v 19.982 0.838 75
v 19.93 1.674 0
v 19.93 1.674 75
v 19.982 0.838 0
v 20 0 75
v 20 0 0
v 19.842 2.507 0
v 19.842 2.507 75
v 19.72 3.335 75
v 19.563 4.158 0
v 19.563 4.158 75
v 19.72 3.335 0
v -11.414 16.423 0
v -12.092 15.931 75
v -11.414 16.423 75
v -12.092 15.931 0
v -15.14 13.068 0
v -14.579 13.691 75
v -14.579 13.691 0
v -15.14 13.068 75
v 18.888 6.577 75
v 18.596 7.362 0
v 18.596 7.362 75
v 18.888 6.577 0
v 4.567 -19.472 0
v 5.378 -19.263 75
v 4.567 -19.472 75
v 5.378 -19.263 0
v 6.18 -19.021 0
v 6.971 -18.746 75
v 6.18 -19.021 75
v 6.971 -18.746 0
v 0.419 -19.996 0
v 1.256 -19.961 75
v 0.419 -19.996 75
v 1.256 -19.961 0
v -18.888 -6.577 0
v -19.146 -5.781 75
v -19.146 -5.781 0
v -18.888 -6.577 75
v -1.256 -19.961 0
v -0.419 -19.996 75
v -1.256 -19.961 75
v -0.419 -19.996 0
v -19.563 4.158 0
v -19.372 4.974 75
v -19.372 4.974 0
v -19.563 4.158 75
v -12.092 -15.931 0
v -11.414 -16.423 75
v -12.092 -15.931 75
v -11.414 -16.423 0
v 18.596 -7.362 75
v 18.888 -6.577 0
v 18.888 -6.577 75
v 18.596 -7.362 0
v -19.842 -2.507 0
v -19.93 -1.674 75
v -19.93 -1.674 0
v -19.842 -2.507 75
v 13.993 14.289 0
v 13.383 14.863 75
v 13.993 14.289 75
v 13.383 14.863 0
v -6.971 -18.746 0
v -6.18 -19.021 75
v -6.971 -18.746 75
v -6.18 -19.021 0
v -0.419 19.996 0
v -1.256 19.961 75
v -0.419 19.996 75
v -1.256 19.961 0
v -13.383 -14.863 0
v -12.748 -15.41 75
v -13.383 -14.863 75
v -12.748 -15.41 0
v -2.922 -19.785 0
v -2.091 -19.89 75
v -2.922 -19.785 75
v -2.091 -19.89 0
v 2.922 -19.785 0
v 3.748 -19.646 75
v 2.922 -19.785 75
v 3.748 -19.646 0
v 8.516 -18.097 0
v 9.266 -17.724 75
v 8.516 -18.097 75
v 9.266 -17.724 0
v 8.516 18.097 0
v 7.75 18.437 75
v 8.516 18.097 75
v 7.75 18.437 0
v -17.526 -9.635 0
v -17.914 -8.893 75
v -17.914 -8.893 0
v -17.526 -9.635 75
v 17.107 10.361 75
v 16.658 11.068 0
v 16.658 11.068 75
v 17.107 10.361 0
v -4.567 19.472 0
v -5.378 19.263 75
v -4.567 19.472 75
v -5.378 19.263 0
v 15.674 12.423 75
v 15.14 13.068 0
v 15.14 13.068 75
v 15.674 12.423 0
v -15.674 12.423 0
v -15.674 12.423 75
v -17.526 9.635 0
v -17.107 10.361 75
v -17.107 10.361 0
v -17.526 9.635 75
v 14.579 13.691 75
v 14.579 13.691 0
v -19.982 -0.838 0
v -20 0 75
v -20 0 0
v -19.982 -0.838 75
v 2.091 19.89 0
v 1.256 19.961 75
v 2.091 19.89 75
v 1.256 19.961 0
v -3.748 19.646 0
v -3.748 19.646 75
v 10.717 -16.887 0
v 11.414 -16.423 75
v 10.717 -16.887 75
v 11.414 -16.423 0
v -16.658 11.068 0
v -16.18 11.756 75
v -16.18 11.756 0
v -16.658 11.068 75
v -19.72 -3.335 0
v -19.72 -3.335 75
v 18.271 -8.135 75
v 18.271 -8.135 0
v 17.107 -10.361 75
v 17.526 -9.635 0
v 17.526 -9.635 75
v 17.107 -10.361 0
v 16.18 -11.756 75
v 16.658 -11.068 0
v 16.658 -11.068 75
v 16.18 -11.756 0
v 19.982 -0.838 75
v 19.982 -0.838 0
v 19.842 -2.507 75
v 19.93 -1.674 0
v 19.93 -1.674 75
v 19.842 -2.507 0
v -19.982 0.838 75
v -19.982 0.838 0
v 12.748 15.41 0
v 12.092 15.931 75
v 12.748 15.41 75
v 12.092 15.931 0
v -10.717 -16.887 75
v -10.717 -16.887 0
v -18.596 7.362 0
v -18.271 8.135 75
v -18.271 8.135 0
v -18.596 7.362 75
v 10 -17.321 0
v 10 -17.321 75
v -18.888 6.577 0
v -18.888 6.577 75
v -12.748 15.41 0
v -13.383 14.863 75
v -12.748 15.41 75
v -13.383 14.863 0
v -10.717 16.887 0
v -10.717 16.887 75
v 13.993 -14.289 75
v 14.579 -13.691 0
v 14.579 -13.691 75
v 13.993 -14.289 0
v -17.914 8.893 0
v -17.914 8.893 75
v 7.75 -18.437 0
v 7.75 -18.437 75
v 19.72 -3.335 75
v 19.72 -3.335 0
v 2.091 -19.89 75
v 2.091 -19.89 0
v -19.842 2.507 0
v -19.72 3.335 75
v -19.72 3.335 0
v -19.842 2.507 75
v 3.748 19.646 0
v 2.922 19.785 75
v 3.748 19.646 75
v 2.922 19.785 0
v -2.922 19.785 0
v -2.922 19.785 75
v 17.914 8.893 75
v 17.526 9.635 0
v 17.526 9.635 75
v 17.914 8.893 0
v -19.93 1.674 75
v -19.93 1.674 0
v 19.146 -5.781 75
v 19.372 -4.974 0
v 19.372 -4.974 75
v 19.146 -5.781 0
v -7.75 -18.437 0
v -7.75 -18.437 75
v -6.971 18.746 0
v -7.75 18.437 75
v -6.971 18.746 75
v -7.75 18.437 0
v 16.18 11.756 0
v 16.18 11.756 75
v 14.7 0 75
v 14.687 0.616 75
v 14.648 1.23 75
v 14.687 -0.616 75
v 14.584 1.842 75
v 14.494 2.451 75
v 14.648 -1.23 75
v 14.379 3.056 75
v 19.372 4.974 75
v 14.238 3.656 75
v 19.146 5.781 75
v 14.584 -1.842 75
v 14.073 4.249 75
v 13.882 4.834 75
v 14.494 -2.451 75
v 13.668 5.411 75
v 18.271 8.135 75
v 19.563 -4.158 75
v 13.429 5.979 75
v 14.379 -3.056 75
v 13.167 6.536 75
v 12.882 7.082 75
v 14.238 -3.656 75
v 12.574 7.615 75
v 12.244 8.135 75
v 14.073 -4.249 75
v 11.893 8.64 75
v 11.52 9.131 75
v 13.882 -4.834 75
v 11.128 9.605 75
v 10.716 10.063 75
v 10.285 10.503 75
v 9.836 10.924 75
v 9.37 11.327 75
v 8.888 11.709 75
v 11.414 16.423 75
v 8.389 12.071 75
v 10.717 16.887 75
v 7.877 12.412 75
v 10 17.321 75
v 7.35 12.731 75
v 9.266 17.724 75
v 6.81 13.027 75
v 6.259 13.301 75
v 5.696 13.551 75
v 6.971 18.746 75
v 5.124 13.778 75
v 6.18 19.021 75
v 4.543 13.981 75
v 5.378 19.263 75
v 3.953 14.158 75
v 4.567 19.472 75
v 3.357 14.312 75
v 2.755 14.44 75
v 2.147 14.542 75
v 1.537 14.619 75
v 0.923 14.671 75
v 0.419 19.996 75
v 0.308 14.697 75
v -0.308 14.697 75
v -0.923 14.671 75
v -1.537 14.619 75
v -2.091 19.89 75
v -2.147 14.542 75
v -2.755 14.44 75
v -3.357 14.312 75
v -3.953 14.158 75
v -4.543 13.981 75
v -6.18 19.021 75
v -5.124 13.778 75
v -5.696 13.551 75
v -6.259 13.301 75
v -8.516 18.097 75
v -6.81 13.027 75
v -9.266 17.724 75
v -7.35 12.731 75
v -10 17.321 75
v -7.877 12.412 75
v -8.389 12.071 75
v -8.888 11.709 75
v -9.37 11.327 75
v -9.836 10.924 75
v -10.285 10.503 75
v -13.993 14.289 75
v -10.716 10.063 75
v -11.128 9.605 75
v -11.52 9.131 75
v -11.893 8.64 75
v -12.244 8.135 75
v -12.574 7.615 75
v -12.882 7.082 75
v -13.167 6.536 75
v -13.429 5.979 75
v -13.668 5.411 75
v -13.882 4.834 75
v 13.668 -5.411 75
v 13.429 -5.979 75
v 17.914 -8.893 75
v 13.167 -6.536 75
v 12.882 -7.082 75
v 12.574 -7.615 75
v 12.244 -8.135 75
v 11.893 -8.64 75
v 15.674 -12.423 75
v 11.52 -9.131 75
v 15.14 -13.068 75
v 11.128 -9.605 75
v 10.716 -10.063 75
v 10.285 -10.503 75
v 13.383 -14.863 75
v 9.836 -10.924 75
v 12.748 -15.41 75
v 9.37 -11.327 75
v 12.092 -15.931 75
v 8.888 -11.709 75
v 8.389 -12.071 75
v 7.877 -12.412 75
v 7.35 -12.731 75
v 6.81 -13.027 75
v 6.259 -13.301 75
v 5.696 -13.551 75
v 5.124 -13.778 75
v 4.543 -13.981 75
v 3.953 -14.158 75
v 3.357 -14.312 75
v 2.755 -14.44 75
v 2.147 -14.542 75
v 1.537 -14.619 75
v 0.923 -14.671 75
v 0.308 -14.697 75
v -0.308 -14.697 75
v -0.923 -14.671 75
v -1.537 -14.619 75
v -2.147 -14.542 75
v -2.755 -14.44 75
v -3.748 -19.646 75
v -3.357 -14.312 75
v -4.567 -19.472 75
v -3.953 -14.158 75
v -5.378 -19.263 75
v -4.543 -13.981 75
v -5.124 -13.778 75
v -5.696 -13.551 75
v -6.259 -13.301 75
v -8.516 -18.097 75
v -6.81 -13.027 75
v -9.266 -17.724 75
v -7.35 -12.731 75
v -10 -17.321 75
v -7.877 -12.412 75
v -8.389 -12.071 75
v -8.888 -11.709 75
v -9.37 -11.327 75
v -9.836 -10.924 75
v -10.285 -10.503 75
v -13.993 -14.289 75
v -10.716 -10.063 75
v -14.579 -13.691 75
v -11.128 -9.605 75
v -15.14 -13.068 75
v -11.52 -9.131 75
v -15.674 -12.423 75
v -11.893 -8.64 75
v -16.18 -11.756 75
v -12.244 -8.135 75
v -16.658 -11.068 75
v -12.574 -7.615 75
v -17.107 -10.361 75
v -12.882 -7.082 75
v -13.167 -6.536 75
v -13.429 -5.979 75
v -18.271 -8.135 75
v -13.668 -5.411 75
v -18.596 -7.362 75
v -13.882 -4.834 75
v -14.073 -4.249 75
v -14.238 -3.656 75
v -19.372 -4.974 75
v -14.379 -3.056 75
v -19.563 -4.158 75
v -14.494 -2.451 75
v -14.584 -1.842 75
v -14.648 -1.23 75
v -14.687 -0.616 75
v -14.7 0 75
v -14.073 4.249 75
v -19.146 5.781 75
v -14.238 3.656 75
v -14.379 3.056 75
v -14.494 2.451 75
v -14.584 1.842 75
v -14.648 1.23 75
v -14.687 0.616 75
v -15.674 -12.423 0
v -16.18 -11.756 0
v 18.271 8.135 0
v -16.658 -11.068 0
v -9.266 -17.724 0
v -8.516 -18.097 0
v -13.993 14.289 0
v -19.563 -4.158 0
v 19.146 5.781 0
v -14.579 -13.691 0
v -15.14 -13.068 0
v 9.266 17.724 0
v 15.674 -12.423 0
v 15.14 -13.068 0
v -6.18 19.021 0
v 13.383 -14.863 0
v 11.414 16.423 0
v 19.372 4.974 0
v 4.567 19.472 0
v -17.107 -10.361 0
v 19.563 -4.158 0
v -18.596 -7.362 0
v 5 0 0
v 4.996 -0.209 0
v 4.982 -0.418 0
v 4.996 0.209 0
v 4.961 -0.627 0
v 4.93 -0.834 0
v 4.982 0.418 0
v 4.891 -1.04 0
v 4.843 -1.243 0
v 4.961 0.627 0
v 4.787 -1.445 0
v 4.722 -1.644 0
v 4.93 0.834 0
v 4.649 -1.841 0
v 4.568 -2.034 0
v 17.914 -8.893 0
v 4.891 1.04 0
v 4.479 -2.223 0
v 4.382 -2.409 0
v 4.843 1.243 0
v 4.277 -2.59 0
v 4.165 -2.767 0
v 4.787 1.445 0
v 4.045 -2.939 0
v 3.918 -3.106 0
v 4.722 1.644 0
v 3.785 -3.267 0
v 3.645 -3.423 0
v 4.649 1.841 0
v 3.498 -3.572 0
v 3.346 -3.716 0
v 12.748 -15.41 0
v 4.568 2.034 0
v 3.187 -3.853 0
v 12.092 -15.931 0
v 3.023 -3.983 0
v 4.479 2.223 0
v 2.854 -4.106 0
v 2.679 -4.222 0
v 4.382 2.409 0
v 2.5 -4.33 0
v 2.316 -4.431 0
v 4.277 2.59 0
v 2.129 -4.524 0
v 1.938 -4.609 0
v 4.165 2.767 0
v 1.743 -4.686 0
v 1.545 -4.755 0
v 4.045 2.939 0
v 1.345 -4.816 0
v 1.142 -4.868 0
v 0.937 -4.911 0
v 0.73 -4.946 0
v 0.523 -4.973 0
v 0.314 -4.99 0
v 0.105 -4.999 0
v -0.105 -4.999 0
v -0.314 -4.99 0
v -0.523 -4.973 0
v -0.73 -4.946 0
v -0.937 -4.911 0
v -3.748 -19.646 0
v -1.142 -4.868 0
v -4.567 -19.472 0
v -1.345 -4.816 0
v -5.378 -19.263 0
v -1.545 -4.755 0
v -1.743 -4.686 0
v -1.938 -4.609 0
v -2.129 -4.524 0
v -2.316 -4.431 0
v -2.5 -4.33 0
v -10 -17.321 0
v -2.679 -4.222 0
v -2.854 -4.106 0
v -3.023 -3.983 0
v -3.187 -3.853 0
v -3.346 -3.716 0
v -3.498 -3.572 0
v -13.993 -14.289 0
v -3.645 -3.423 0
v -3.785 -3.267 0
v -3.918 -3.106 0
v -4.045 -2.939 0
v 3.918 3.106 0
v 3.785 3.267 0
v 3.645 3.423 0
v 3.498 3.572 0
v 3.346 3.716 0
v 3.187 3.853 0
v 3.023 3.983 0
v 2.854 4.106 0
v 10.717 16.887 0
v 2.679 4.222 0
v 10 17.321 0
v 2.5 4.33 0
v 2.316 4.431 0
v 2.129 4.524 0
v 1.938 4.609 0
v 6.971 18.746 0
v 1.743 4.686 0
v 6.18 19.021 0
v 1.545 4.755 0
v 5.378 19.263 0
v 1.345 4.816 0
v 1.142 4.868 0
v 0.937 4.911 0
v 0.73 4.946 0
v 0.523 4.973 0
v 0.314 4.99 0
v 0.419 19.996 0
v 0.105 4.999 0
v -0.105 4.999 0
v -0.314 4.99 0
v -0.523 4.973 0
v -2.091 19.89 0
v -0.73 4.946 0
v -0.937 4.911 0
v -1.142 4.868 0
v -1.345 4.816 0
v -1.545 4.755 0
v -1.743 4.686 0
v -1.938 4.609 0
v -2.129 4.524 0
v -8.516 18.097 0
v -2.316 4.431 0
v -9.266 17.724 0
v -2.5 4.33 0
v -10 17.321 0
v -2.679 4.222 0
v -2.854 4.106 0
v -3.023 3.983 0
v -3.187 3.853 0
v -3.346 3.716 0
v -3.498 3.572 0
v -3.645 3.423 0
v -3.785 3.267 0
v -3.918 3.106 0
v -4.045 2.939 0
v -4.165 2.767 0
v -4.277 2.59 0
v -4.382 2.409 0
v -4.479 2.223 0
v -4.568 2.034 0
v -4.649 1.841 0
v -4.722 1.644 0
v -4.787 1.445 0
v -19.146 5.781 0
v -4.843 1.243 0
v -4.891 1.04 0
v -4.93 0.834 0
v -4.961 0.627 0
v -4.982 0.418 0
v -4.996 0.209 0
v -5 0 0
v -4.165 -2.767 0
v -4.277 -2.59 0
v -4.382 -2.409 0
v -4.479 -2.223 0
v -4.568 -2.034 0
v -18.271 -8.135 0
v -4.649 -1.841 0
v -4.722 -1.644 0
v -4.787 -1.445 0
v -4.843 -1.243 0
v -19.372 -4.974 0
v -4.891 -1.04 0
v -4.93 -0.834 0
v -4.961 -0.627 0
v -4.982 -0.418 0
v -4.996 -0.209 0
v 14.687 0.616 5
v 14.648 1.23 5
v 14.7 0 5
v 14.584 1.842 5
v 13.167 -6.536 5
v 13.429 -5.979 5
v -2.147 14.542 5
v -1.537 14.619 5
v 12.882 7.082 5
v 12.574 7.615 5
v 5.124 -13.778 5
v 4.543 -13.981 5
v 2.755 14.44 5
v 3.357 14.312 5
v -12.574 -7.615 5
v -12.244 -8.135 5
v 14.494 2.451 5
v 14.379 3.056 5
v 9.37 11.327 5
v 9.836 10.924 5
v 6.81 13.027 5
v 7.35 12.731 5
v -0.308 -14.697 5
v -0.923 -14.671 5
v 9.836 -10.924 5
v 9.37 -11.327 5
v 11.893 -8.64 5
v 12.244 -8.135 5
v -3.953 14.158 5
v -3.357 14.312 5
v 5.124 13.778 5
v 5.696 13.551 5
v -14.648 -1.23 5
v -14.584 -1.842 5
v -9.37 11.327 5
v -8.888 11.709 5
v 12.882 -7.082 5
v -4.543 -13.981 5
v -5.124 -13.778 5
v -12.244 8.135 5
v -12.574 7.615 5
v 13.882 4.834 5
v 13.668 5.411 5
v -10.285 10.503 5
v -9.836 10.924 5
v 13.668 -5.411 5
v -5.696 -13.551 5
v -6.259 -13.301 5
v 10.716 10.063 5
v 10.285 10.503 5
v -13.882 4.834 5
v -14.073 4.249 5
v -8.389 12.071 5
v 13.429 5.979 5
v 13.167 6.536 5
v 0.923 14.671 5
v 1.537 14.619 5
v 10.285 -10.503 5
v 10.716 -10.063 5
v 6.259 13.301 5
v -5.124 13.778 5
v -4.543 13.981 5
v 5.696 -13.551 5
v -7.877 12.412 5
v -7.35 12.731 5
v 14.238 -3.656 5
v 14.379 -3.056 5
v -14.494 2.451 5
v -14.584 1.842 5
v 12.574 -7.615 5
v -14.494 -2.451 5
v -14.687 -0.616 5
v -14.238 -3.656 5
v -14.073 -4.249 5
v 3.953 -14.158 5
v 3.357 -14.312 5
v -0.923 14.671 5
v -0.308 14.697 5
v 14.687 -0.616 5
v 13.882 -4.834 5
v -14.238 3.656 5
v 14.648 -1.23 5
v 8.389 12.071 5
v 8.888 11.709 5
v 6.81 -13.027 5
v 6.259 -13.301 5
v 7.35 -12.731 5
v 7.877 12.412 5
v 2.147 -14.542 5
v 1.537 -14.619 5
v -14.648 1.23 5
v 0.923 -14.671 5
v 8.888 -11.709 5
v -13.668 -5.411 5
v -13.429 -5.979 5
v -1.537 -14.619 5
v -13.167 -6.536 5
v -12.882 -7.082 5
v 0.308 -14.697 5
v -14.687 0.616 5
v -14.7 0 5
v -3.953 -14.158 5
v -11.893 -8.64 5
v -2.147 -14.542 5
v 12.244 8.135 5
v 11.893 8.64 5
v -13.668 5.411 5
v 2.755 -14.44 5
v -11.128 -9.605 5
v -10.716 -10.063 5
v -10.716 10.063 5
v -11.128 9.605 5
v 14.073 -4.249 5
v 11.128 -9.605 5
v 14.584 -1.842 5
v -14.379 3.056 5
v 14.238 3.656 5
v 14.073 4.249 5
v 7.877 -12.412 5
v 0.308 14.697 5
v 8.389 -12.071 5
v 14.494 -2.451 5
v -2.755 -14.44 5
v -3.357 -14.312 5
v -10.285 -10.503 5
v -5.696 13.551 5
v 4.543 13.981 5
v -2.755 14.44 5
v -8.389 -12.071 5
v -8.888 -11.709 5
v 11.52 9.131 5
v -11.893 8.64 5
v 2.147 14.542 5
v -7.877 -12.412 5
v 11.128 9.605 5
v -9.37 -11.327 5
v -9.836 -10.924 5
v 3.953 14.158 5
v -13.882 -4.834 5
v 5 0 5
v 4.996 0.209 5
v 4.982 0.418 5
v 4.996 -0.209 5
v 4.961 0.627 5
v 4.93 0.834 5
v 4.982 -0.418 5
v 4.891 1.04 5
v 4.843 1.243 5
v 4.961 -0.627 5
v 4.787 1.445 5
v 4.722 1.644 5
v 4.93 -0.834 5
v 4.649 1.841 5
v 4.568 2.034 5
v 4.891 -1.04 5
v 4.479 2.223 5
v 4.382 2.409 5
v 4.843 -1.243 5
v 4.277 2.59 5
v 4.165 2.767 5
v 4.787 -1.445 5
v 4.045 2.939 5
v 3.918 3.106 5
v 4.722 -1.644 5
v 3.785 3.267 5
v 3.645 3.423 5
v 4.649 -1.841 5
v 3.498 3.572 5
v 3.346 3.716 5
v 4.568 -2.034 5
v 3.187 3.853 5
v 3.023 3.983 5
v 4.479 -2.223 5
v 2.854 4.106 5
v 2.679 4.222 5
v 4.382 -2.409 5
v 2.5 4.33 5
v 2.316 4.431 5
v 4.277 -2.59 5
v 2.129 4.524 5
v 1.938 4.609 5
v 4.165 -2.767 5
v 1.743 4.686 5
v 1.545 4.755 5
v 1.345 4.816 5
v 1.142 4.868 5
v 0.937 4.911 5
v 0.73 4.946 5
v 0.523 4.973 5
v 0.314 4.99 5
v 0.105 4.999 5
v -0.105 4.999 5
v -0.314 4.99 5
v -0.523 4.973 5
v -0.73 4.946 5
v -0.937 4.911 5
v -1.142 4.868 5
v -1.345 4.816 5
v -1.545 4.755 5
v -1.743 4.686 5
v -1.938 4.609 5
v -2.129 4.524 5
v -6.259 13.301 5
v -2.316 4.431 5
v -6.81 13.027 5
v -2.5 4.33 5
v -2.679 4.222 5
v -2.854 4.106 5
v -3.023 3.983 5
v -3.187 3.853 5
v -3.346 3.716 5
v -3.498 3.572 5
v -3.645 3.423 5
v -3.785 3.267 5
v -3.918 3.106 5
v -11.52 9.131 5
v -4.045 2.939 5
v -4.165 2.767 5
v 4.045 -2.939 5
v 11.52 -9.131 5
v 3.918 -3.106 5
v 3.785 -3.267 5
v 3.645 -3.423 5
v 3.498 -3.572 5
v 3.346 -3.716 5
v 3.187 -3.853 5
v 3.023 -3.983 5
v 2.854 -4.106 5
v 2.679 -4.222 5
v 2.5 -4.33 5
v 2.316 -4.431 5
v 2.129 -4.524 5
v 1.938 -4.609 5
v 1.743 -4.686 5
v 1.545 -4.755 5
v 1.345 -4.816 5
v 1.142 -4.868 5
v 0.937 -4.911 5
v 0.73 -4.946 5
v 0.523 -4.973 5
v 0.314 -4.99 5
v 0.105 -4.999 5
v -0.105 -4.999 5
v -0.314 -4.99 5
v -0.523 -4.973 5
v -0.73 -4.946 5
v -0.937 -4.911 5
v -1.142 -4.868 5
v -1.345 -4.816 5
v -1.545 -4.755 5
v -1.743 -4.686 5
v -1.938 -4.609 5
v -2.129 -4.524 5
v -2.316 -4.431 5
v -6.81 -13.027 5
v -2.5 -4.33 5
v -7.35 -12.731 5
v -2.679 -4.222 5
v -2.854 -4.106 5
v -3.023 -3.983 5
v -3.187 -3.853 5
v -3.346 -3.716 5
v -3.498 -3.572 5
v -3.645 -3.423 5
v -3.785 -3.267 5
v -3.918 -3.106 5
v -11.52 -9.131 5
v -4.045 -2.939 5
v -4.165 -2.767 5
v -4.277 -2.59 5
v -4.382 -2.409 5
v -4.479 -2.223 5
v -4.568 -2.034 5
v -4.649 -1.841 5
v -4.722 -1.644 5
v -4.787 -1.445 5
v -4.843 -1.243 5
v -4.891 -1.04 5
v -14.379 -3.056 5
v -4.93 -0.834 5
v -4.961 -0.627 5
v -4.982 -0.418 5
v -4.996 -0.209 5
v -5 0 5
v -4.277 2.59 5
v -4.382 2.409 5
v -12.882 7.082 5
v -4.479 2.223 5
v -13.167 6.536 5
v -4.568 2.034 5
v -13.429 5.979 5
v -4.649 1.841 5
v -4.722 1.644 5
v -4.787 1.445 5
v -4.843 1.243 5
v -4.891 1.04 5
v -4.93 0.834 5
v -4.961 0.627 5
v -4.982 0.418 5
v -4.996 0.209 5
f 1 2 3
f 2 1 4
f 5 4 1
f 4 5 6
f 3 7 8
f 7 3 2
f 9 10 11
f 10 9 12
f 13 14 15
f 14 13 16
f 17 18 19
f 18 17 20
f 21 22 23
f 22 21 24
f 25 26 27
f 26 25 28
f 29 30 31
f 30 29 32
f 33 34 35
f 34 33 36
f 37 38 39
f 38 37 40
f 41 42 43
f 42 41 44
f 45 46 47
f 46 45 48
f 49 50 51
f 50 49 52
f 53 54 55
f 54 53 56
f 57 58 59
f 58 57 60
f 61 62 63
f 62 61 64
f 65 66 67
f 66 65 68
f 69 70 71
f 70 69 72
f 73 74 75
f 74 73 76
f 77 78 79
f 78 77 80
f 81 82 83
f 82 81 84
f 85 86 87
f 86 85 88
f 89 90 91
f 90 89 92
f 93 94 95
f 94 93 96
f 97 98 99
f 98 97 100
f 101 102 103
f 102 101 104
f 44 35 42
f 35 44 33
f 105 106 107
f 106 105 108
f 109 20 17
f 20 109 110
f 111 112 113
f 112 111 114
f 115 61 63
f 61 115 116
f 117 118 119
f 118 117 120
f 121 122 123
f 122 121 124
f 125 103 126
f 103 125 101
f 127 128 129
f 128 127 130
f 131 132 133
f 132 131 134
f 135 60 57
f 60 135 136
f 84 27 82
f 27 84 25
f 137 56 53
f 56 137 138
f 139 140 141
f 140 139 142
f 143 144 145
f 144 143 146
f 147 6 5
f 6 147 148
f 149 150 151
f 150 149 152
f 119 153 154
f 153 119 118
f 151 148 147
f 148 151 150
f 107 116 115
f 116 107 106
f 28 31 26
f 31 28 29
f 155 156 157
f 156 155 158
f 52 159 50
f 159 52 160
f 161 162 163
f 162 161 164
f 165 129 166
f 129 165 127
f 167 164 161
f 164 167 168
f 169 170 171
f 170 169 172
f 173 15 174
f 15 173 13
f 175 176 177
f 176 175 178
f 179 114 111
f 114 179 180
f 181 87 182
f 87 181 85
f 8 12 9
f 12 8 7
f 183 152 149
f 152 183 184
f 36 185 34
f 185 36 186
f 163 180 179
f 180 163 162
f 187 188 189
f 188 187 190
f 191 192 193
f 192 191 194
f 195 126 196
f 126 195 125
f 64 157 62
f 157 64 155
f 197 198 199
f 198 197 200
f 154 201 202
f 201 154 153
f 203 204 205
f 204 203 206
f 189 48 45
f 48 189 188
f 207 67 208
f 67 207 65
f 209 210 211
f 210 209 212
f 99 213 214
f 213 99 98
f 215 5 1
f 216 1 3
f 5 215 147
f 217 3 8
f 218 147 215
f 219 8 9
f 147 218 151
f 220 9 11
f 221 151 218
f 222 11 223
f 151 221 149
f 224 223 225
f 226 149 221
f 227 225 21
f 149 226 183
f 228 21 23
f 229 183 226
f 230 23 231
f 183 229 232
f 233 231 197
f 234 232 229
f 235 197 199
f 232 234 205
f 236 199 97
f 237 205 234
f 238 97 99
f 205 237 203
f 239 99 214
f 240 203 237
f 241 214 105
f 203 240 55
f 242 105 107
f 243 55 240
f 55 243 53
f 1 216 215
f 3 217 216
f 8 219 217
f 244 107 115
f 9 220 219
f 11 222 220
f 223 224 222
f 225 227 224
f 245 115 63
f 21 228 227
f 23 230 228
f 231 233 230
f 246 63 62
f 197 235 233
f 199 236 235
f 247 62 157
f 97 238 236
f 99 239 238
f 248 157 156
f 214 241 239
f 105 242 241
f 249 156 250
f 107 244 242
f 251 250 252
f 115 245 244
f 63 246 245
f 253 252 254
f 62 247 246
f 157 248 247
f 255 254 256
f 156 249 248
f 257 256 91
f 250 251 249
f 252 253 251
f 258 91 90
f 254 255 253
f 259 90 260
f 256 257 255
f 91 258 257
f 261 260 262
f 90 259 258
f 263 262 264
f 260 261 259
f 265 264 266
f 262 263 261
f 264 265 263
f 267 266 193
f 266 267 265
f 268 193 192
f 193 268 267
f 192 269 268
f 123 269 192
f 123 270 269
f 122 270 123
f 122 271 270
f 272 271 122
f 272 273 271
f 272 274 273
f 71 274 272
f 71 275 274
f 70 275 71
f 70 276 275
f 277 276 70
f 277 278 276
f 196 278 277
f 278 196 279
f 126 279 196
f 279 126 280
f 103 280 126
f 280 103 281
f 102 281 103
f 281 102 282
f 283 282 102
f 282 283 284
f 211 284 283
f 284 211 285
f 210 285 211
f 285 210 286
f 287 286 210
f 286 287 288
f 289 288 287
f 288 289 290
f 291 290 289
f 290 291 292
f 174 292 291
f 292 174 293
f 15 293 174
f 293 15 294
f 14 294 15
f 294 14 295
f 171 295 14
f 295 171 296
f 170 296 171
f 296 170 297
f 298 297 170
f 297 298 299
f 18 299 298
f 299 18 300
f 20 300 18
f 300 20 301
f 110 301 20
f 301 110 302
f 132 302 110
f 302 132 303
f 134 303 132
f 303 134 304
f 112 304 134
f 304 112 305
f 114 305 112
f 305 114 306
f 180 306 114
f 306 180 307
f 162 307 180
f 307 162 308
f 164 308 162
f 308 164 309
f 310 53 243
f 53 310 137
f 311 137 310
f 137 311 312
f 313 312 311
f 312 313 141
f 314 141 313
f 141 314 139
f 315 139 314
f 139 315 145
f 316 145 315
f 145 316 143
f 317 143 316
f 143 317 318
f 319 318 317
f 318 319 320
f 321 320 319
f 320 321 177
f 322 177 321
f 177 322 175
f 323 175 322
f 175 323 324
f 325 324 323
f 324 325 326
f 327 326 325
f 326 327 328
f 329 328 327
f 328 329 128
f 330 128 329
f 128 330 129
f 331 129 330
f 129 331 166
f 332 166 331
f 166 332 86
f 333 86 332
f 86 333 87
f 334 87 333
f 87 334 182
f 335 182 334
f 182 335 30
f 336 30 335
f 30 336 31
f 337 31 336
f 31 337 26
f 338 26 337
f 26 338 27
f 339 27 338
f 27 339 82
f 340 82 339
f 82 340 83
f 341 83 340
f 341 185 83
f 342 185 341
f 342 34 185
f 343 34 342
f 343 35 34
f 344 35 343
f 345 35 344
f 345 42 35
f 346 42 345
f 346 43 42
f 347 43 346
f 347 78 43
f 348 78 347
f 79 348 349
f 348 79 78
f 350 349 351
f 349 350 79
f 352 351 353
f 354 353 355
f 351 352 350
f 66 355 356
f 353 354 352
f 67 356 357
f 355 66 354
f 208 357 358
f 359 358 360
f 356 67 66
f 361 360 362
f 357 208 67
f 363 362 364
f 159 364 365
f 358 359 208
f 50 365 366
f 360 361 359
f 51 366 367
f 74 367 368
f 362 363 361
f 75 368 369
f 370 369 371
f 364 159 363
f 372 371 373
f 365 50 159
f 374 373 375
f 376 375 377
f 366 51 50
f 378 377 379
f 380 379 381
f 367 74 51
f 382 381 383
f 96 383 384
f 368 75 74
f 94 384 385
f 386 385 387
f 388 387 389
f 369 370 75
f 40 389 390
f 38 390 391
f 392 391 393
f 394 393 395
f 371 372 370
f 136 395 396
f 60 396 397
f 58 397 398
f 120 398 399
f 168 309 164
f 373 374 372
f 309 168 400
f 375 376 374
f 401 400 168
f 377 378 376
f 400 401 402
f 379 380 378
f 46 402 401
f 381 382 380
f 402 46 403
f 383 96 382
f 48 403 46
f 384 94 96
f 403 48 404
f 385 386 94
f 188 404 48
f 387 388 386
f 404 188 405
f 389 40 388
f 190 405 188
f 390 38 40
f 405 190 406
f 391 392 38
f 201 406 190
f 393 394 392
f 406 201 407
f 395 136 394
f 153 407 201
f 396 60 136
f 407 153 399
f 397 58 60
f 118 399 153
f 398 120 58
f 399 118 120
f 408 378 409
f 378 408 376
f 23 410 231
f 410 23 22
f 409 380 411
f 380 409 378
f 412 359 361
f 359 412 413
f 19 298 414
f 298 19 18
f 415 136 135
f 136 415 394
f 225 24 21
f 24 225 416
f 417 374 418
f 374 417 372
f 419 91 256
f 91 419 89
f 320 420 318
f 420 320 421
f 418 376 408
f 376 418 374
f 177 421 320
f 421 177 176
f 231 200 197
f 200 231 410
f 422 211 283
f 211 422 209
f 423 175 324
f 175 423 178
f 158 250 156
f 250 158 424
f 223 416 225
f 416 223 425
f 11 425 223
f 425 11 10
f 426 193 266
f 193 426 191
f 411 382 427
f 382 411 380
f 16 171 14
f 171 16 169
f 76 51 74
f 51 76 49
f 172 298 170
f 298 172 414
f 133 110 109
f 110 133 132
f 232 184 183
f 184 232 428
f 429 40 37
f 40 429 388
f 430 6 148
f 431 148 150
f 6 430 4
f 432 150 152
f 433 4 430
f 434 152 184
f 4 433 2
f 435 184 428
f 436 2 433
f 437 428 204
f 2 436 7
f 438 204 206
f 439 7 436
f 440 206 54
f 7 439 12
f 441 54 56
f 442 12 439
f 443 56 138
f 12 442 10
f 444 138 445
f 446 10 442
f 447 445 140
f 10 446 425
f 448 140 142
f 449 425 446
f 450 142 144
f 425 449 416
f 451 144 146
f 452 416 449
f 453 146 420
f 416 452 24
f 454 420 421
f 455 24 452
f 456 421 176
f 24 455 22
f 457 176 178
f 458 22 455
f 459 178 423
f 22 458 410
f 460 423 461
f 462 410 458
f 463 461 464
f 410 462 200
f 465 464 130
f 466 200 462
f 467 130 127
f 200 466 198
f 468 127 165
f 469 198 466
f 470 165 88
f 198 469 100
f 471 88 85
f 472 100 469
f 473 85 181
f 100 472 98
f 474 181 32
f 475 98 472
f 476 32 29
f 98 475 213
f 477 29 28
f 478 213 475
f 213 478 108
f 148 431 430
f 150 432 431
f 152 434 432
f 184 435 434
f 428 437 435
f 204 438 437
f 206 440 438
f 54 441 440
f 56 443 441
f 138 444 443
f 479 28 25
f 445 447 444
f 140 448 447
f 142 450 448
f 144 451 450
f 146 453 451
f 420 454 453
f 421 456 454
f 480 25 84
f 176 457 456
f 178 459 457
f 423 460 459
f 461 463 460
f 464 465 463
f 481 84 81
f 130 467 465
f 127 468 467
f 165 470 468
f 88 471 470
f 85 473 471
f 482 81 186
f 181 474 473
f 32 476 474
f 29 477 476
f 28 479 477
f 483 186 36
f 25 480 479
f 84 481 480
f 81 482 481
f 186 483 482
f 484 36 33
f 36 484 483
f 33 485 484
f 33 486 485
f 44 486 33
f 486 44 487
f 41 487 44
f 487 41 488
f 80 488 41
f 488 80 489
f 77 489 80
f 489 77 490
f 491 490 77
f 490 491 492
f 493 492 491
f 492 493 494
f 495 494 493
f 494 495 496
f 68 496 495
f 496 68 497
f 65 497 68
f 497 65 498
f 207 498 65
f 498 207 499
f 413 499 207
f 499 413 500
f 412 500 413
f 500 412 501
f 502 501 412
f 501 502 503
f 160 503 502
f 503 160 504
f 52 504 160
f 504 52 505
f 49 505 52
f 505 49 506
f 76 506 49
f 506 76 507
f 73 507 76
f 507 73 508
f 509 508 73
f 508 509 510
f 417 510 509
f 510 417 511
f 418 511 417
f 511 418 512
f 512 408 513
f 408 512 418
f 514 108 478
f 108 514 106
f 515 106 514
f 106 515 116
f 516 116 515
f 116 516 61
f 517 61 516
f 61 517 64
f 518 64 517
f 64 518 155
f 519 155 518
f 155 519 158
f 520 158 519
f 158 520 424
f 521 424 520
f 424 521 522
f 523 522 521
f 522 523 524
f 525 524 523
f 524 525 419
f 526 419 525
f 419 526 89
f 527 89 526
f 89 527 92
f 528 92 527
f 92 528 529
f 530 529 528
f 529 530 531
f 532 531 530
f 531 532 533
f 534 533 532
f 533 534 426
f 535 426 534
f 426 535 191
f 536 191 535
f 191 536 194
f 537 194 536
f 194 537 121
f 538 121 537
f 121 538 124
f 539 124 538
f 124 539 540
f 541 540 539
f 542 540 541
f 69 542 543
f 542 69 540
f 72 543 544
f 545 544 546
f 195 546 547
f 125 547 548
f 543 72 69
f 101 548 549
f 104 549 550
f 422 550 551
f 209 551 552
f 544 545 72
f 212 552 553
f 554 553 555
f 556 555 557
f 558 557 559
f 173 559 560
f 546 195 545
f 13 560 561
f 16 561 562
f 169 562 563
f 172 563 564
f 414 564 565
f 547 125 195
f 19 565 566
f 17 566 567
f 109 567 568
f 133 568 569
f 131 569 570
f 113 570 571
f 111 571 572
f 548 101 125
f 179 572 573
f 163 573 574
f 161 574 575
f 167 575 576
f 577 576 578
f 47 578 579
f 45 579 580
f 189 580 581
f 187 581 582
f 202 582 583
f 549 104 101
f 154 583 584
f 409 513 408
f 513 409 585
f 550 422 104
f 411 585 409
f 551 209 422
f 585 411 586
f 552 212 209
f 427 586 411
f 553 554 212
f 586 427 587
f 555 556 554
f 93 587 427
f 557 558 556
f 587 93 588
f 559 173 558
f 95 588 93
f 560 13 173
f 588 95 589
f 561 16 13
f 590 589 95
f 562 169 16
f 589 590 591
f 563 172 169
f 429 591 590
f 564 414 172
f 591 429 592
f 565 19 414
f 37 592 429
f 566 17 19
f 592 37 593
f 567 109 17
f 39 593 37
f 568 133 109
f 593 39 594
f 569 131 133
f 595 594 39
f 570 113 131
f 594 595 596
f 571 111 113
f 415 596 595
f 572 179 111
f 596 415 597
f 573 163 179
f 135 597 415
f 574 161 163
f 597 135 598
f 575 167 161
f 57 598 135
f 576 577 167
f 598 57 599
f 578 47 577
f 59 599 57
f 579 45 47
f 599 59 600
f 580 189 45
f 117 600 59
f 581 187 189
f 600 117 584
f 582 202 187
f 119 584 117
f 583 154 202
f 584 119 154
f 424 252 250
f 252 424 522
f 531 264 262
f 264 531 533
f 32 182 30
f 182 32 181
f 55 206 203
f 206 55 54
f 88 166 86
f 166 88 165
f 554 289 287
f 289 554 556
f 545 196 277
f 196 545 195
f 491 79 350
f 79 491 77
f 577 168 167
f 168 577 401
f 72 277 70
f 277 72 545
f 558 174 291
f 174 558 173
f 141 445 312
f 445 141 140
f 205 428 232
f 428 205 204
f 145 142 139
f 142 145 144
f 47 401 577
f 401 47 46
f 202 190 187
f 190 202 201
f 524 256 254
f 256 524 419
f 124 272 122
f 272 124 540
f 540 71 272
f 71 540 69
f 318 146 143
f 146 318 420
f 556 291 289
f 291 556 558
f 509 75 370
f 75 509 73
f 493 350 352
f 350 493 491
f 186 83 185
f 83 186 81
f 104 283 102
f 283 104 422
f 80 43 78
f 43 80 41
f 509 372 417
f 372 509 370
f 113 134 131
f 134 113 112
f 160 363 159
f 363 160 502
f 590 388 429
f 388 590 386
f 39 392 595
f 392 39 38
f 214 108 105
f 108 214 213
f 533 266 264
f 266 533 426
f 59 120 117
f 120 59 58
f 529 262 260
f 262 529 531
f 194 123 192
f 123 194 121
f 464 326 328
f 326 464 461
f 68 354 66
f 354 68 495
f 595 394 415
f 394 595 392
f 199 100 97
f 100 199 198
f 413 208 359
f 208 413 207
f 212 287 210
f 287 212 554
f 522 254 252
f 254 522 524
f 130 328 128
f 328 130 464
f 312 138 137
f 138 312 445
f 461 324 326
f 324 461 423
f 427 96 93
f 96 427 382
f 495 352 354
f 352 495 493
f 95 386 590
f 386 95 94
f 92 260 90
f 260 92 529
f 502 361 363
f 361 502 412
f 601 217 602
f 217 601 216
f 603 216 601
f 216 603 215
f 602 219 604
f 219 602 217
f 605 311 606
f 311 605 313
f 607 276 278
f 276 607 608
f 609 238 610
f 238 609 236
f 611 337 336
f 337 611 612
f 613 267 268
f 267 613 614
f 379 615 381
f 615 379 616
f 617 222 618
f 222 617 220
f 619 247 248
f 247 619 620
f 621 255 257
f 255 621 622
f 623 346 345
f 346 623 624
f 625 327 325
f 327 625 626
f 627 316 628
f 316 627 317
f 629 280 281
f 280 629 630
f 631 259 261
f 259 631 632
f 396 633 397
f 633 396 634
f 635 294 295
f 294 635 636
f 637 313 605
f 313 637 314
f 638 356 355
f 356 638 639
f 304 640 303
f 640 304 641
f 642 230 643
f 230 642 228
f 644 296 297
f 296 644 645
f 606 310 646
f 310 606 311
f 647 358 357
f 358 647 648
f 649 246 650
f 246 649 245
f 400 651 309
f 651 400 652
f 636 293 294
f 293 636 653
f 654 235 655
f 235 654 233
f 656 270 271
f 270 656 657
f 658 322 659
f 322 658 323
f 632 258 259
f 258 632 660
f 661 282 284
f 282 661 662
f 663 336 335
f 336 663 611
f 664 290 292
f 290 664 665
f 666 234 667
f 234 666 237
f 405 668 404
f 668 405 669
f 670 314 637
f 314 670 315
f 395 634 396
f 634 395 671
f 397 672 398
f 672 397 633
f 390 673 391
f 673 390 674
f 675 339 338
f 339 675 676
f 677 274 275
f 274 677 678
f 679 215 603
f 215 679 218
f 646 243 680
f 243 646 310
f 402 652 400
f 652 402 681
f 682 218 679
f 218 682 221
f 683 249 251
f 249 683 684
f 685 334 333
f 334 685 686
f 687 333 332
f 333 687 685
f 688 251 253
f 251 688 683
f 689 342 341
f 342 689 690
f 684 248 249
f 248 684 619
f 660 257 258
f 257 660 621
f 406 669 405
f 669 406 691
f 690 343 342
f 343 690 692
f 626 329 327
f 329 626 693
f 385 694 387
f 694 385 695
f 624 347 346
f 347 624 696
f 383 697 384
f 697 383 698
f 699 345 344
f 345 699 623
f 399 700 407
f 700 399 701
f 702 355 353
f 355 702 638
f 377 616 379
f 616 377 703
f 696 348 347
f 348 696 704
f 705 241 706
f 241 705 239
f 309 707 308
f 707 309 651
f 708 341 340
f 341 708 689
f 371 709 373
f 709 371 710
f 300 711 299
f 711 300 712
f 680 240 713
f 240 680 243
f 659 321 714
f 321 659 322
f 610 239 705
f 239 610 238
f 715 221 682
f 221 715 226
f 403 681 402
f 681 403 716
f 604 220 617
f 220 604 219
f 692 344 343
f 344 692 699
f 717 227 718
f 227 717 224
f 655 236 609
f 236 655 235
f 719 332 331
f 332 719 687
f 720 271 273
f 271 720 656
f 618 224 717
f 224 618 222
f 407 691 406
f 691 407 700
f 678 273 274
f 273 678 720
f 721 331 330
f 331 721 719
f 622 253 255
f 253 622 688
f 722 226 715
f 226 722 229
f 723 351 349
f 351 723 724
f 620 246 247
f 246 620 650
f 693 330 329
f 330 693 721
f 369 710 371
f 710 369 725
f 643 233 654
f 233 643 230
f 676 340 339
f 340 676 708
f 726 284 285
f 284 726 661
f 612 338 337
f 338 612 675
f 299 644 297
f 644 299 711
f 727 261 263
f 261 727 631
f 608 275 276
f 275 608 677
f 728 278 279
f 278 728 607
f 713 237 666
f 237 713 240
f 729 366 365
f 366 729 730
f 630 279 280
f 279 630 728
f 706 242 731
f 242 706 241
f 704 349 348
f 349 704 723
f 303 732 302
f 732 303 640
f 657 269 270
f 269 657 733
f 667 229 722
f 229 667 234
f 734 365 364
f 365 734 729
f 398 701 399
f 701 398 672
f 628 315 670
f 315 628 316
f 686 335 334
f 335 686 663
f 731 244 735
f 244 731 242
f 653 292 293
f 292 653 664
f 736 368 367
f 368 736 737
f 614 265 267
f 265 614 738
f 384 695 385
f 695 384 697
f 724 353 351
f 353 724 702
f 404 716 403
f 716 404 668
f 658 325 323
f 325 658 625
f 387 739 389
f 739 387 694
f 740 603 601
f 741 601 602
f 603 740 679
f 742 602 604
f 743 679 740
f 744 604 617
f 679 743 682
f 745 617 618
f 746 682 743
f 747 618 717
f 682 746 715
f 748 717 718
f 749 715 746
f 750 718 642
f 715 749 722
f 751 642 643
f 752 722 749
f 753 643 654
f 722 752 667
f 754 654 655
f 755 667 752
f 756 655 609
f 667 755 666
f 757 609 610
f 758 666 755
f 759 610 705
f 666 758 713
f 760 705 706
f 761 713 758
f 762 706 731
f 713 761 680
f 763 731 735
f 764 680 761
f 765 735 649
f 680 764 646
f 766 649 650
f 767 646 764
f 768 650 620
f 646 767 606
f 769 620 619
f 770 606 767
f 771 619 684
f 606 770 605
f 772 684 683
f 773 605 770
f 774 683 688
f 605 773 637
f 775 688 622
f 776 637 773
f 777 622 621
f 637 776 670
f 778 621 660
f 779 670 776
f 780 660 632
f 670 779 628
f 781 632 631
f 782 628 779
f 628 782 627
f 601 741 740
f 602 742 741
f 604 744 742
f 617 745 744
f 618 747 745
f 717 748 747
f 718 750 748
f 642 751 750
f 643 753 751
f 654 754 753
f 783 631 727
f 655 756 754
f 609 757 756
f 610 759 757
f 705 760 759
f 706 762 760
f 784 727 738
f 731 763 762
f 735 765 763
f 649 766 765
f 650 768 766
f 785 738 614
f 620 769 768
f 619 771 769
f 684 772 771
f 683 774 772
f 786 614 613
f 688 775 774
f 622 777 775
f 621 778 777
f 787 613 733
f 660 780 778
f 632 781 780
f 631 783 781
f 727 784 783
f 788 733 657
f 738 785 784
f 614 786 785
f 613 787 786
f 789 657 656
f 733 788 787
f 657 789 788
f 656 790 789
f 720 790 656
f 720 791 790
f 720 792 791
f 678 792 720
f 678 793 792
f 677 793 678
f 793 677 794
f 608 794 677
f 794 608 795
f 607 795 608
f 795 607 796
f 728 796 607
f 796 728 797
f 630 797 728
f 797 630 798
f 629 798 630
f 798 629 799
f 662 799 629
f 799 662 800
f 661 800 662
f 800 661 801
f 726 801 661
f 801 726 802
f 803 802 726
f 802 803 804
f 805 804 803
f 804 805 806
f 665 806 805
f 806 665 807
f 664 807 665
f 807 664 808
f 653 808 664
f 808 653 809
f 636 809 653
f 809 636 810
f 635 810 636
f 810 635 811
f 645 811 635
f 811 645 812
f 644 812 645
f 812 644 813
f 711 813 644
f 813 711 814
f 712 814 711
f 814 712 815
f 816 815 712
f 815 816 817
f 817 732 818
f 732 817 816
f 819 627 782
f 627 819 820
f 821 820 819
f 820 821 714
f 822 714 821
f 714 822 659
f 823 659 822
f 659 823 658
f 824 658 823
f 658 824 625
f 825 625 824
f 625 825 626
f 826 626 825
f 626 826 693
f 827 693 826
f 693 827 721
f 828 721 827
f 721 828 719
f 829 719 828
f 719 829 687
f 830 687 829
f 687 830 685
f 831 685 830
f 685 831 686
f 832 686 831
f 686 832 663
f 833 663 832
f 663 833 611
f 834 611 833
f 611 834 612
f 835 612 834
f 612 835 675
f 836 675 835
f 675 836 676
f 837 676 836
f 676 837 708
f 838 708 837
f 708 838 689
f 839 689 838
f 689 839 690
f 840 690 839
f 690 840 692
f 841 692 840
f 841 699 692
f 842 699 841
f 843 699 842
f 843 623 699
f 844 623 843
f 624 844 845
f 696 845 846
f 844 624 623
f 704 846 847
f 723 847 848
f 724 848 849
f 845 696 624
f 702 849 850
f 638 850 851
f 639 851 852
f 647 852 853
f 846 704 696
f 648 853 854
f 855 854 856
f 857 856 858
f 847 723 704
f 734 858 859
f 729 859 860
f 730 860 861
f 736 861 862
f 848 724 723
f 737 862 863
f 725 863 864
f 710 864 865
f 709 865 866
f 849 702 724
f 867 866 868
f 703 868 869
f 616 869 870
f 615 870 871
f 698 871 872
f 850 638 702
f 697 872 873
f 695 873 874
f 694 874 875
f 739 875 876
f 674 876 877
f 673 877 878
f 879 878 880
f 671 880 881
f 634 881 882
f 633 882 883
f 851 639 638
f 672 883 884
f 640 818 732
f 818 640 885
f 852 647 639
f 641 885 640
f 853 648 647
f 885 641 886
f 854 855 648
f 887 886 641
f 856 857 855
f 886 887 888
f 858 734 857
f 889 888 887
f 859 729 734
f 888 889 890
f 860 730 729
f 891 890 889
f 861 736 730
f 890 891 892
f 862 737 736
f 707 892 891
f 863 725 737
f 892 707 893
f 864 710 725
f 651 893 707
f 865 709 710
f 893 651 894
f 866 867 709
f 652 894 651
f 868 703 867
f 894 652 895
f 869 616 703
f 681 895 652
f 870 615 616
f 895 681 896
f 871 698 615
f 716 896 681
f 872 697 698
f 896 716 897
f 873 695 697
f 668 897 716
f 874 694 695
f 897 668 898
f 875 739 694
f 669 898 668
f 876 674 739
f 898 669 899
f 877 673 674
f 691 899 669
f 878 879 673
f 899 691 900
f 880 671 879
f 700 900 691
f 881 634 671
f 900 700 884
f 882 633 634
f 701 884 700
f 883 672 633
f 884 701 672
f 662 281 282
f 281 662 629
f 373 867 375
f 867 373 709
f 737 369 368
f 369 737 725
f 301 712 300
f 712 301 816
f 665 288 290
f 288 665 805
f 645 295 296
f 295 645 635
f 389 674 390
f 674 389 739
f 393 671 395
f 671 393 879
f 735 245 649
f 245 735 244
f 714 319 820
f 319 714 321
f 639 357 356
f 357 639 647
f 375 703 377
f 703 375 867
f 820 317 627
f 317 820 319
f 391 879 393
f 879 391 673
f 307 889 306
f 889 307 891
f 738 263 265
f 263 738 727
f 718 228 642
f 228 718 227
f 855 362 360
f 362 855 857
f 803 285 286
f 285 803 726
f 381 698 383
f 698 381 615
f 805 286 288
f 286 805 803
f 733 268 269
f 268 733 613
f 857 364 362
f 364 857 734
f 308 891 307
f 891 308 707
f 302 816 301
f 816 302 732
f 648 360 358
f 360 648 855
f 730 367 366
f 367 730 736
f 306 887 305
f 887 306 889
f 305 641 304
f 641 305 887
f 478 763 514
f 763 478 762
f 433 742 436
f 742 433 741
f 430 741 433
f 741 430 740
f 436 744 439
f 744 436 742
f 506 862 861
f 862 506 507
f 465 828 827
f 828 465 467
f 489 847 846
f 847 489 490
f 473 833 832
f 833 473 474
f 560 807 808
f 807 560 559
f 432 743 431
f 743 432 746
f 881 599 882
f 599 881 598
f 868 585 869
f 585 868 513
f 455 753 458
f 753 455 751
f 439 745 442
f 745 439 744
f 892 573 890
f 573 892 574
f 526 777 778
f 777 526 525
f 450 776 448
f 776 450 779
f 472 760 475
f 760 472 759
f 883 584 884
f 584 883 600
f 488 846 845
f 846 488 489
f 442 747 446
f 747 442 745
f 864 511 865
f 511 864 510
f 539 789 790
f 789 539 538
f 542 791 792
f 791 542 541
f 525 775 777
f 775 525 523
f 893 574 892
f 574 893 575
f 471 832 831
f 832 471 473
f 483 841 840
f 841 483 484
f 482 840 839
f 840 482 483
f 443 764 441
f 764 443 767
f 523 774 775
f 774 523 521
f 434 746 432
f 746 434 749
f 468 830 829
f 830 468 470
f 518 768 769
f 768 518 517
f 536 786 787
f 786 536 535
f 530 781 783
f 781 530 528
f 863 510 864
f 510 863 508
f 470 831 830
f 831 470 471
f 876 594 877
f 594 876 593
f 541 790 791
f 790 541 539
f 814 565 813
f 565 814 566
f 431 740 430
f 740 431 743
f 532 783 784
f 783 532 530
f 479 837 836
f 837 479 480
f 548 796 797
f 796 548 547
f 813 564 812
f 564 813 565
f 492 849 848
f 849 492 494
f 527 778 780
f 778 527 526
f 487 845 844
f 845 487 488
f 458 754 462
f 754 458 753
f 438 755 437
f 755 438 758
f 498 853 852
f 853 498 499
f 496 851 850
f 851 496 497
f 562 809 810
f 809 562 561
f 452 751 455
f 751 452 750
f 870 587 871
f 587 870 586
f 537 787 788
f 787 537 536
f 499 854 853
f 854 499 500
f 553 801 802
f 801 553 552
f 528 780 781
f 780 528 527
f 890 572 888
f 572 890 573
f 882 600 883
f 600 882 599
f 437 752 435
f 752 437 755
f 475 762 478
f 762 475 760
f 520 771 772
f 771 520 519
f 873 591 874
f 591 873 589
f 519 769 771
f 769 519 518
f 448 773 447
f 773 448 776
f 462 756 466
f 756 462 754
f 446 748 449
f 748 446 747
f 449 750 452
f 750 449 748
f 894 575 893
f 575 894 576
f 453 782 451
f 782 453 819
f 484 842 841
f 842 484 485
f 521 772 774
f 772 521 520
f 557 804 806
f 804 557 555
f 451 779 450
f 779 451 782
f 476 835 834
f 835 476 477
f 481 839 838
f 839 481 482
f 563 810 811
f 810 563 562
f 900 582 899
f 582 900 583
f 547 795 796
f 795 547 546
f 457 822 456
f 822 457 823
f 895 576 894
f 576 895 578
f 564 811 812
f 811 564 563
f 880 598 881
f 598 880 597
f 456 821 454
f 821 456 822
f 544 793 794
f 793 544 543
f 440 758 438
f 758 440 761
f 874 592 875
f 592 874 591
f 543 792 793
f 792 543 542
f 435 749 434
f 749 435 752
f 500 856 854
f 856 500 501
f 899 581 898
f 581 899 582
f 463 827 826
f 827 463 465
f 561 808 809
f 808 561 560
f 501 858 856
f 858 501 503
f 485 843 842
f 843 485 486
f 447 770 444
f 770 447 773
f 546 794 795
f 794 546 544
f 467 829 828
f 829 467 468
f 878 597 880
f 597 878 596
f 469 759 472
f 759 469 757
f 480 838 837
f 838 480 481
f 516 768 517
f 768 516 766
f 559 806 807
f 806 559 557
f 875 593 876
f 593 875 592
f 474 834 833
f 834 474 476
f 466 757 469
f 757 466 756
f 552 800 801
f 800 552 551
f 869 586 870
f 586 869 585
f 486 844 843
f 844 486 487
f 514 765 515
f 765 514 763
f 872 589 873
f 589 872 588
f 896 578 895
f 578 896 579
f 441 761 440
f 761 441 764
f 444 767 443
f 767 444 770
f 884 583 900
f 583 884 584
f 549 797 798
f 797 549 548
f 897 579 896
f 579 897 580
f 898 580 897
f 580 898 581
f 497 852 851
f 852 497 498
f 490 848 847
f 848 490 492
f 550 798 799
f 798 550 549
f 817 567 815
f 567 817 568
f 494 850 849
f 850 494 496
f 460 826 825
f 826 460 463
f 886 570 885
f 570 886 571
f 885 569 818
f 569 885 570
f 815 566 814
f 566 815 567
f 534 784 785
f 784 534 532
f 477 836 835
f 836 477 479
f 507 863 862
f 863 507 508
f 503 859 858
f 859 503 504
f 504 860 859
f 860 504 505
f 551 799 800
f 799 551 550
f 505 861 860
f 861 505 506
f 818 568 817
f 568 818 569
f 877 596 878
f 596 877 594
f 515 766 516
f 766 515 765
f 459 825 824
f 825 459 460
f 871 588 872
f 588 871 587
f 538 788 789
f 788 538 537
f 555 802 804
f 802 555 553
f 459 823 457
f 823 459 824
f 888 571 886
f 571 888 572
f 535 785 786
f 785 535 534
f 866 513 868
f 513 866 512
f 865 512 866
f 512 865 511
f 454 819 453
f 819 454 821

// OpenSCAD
$fn=150;

difference()
{
	cylinder(d=40, h=75);
	translate([0,0,5]) cylinder(d=29.4, h=75);
	translate([0,0,-1]) cylinder(d=10, h=10);
}
